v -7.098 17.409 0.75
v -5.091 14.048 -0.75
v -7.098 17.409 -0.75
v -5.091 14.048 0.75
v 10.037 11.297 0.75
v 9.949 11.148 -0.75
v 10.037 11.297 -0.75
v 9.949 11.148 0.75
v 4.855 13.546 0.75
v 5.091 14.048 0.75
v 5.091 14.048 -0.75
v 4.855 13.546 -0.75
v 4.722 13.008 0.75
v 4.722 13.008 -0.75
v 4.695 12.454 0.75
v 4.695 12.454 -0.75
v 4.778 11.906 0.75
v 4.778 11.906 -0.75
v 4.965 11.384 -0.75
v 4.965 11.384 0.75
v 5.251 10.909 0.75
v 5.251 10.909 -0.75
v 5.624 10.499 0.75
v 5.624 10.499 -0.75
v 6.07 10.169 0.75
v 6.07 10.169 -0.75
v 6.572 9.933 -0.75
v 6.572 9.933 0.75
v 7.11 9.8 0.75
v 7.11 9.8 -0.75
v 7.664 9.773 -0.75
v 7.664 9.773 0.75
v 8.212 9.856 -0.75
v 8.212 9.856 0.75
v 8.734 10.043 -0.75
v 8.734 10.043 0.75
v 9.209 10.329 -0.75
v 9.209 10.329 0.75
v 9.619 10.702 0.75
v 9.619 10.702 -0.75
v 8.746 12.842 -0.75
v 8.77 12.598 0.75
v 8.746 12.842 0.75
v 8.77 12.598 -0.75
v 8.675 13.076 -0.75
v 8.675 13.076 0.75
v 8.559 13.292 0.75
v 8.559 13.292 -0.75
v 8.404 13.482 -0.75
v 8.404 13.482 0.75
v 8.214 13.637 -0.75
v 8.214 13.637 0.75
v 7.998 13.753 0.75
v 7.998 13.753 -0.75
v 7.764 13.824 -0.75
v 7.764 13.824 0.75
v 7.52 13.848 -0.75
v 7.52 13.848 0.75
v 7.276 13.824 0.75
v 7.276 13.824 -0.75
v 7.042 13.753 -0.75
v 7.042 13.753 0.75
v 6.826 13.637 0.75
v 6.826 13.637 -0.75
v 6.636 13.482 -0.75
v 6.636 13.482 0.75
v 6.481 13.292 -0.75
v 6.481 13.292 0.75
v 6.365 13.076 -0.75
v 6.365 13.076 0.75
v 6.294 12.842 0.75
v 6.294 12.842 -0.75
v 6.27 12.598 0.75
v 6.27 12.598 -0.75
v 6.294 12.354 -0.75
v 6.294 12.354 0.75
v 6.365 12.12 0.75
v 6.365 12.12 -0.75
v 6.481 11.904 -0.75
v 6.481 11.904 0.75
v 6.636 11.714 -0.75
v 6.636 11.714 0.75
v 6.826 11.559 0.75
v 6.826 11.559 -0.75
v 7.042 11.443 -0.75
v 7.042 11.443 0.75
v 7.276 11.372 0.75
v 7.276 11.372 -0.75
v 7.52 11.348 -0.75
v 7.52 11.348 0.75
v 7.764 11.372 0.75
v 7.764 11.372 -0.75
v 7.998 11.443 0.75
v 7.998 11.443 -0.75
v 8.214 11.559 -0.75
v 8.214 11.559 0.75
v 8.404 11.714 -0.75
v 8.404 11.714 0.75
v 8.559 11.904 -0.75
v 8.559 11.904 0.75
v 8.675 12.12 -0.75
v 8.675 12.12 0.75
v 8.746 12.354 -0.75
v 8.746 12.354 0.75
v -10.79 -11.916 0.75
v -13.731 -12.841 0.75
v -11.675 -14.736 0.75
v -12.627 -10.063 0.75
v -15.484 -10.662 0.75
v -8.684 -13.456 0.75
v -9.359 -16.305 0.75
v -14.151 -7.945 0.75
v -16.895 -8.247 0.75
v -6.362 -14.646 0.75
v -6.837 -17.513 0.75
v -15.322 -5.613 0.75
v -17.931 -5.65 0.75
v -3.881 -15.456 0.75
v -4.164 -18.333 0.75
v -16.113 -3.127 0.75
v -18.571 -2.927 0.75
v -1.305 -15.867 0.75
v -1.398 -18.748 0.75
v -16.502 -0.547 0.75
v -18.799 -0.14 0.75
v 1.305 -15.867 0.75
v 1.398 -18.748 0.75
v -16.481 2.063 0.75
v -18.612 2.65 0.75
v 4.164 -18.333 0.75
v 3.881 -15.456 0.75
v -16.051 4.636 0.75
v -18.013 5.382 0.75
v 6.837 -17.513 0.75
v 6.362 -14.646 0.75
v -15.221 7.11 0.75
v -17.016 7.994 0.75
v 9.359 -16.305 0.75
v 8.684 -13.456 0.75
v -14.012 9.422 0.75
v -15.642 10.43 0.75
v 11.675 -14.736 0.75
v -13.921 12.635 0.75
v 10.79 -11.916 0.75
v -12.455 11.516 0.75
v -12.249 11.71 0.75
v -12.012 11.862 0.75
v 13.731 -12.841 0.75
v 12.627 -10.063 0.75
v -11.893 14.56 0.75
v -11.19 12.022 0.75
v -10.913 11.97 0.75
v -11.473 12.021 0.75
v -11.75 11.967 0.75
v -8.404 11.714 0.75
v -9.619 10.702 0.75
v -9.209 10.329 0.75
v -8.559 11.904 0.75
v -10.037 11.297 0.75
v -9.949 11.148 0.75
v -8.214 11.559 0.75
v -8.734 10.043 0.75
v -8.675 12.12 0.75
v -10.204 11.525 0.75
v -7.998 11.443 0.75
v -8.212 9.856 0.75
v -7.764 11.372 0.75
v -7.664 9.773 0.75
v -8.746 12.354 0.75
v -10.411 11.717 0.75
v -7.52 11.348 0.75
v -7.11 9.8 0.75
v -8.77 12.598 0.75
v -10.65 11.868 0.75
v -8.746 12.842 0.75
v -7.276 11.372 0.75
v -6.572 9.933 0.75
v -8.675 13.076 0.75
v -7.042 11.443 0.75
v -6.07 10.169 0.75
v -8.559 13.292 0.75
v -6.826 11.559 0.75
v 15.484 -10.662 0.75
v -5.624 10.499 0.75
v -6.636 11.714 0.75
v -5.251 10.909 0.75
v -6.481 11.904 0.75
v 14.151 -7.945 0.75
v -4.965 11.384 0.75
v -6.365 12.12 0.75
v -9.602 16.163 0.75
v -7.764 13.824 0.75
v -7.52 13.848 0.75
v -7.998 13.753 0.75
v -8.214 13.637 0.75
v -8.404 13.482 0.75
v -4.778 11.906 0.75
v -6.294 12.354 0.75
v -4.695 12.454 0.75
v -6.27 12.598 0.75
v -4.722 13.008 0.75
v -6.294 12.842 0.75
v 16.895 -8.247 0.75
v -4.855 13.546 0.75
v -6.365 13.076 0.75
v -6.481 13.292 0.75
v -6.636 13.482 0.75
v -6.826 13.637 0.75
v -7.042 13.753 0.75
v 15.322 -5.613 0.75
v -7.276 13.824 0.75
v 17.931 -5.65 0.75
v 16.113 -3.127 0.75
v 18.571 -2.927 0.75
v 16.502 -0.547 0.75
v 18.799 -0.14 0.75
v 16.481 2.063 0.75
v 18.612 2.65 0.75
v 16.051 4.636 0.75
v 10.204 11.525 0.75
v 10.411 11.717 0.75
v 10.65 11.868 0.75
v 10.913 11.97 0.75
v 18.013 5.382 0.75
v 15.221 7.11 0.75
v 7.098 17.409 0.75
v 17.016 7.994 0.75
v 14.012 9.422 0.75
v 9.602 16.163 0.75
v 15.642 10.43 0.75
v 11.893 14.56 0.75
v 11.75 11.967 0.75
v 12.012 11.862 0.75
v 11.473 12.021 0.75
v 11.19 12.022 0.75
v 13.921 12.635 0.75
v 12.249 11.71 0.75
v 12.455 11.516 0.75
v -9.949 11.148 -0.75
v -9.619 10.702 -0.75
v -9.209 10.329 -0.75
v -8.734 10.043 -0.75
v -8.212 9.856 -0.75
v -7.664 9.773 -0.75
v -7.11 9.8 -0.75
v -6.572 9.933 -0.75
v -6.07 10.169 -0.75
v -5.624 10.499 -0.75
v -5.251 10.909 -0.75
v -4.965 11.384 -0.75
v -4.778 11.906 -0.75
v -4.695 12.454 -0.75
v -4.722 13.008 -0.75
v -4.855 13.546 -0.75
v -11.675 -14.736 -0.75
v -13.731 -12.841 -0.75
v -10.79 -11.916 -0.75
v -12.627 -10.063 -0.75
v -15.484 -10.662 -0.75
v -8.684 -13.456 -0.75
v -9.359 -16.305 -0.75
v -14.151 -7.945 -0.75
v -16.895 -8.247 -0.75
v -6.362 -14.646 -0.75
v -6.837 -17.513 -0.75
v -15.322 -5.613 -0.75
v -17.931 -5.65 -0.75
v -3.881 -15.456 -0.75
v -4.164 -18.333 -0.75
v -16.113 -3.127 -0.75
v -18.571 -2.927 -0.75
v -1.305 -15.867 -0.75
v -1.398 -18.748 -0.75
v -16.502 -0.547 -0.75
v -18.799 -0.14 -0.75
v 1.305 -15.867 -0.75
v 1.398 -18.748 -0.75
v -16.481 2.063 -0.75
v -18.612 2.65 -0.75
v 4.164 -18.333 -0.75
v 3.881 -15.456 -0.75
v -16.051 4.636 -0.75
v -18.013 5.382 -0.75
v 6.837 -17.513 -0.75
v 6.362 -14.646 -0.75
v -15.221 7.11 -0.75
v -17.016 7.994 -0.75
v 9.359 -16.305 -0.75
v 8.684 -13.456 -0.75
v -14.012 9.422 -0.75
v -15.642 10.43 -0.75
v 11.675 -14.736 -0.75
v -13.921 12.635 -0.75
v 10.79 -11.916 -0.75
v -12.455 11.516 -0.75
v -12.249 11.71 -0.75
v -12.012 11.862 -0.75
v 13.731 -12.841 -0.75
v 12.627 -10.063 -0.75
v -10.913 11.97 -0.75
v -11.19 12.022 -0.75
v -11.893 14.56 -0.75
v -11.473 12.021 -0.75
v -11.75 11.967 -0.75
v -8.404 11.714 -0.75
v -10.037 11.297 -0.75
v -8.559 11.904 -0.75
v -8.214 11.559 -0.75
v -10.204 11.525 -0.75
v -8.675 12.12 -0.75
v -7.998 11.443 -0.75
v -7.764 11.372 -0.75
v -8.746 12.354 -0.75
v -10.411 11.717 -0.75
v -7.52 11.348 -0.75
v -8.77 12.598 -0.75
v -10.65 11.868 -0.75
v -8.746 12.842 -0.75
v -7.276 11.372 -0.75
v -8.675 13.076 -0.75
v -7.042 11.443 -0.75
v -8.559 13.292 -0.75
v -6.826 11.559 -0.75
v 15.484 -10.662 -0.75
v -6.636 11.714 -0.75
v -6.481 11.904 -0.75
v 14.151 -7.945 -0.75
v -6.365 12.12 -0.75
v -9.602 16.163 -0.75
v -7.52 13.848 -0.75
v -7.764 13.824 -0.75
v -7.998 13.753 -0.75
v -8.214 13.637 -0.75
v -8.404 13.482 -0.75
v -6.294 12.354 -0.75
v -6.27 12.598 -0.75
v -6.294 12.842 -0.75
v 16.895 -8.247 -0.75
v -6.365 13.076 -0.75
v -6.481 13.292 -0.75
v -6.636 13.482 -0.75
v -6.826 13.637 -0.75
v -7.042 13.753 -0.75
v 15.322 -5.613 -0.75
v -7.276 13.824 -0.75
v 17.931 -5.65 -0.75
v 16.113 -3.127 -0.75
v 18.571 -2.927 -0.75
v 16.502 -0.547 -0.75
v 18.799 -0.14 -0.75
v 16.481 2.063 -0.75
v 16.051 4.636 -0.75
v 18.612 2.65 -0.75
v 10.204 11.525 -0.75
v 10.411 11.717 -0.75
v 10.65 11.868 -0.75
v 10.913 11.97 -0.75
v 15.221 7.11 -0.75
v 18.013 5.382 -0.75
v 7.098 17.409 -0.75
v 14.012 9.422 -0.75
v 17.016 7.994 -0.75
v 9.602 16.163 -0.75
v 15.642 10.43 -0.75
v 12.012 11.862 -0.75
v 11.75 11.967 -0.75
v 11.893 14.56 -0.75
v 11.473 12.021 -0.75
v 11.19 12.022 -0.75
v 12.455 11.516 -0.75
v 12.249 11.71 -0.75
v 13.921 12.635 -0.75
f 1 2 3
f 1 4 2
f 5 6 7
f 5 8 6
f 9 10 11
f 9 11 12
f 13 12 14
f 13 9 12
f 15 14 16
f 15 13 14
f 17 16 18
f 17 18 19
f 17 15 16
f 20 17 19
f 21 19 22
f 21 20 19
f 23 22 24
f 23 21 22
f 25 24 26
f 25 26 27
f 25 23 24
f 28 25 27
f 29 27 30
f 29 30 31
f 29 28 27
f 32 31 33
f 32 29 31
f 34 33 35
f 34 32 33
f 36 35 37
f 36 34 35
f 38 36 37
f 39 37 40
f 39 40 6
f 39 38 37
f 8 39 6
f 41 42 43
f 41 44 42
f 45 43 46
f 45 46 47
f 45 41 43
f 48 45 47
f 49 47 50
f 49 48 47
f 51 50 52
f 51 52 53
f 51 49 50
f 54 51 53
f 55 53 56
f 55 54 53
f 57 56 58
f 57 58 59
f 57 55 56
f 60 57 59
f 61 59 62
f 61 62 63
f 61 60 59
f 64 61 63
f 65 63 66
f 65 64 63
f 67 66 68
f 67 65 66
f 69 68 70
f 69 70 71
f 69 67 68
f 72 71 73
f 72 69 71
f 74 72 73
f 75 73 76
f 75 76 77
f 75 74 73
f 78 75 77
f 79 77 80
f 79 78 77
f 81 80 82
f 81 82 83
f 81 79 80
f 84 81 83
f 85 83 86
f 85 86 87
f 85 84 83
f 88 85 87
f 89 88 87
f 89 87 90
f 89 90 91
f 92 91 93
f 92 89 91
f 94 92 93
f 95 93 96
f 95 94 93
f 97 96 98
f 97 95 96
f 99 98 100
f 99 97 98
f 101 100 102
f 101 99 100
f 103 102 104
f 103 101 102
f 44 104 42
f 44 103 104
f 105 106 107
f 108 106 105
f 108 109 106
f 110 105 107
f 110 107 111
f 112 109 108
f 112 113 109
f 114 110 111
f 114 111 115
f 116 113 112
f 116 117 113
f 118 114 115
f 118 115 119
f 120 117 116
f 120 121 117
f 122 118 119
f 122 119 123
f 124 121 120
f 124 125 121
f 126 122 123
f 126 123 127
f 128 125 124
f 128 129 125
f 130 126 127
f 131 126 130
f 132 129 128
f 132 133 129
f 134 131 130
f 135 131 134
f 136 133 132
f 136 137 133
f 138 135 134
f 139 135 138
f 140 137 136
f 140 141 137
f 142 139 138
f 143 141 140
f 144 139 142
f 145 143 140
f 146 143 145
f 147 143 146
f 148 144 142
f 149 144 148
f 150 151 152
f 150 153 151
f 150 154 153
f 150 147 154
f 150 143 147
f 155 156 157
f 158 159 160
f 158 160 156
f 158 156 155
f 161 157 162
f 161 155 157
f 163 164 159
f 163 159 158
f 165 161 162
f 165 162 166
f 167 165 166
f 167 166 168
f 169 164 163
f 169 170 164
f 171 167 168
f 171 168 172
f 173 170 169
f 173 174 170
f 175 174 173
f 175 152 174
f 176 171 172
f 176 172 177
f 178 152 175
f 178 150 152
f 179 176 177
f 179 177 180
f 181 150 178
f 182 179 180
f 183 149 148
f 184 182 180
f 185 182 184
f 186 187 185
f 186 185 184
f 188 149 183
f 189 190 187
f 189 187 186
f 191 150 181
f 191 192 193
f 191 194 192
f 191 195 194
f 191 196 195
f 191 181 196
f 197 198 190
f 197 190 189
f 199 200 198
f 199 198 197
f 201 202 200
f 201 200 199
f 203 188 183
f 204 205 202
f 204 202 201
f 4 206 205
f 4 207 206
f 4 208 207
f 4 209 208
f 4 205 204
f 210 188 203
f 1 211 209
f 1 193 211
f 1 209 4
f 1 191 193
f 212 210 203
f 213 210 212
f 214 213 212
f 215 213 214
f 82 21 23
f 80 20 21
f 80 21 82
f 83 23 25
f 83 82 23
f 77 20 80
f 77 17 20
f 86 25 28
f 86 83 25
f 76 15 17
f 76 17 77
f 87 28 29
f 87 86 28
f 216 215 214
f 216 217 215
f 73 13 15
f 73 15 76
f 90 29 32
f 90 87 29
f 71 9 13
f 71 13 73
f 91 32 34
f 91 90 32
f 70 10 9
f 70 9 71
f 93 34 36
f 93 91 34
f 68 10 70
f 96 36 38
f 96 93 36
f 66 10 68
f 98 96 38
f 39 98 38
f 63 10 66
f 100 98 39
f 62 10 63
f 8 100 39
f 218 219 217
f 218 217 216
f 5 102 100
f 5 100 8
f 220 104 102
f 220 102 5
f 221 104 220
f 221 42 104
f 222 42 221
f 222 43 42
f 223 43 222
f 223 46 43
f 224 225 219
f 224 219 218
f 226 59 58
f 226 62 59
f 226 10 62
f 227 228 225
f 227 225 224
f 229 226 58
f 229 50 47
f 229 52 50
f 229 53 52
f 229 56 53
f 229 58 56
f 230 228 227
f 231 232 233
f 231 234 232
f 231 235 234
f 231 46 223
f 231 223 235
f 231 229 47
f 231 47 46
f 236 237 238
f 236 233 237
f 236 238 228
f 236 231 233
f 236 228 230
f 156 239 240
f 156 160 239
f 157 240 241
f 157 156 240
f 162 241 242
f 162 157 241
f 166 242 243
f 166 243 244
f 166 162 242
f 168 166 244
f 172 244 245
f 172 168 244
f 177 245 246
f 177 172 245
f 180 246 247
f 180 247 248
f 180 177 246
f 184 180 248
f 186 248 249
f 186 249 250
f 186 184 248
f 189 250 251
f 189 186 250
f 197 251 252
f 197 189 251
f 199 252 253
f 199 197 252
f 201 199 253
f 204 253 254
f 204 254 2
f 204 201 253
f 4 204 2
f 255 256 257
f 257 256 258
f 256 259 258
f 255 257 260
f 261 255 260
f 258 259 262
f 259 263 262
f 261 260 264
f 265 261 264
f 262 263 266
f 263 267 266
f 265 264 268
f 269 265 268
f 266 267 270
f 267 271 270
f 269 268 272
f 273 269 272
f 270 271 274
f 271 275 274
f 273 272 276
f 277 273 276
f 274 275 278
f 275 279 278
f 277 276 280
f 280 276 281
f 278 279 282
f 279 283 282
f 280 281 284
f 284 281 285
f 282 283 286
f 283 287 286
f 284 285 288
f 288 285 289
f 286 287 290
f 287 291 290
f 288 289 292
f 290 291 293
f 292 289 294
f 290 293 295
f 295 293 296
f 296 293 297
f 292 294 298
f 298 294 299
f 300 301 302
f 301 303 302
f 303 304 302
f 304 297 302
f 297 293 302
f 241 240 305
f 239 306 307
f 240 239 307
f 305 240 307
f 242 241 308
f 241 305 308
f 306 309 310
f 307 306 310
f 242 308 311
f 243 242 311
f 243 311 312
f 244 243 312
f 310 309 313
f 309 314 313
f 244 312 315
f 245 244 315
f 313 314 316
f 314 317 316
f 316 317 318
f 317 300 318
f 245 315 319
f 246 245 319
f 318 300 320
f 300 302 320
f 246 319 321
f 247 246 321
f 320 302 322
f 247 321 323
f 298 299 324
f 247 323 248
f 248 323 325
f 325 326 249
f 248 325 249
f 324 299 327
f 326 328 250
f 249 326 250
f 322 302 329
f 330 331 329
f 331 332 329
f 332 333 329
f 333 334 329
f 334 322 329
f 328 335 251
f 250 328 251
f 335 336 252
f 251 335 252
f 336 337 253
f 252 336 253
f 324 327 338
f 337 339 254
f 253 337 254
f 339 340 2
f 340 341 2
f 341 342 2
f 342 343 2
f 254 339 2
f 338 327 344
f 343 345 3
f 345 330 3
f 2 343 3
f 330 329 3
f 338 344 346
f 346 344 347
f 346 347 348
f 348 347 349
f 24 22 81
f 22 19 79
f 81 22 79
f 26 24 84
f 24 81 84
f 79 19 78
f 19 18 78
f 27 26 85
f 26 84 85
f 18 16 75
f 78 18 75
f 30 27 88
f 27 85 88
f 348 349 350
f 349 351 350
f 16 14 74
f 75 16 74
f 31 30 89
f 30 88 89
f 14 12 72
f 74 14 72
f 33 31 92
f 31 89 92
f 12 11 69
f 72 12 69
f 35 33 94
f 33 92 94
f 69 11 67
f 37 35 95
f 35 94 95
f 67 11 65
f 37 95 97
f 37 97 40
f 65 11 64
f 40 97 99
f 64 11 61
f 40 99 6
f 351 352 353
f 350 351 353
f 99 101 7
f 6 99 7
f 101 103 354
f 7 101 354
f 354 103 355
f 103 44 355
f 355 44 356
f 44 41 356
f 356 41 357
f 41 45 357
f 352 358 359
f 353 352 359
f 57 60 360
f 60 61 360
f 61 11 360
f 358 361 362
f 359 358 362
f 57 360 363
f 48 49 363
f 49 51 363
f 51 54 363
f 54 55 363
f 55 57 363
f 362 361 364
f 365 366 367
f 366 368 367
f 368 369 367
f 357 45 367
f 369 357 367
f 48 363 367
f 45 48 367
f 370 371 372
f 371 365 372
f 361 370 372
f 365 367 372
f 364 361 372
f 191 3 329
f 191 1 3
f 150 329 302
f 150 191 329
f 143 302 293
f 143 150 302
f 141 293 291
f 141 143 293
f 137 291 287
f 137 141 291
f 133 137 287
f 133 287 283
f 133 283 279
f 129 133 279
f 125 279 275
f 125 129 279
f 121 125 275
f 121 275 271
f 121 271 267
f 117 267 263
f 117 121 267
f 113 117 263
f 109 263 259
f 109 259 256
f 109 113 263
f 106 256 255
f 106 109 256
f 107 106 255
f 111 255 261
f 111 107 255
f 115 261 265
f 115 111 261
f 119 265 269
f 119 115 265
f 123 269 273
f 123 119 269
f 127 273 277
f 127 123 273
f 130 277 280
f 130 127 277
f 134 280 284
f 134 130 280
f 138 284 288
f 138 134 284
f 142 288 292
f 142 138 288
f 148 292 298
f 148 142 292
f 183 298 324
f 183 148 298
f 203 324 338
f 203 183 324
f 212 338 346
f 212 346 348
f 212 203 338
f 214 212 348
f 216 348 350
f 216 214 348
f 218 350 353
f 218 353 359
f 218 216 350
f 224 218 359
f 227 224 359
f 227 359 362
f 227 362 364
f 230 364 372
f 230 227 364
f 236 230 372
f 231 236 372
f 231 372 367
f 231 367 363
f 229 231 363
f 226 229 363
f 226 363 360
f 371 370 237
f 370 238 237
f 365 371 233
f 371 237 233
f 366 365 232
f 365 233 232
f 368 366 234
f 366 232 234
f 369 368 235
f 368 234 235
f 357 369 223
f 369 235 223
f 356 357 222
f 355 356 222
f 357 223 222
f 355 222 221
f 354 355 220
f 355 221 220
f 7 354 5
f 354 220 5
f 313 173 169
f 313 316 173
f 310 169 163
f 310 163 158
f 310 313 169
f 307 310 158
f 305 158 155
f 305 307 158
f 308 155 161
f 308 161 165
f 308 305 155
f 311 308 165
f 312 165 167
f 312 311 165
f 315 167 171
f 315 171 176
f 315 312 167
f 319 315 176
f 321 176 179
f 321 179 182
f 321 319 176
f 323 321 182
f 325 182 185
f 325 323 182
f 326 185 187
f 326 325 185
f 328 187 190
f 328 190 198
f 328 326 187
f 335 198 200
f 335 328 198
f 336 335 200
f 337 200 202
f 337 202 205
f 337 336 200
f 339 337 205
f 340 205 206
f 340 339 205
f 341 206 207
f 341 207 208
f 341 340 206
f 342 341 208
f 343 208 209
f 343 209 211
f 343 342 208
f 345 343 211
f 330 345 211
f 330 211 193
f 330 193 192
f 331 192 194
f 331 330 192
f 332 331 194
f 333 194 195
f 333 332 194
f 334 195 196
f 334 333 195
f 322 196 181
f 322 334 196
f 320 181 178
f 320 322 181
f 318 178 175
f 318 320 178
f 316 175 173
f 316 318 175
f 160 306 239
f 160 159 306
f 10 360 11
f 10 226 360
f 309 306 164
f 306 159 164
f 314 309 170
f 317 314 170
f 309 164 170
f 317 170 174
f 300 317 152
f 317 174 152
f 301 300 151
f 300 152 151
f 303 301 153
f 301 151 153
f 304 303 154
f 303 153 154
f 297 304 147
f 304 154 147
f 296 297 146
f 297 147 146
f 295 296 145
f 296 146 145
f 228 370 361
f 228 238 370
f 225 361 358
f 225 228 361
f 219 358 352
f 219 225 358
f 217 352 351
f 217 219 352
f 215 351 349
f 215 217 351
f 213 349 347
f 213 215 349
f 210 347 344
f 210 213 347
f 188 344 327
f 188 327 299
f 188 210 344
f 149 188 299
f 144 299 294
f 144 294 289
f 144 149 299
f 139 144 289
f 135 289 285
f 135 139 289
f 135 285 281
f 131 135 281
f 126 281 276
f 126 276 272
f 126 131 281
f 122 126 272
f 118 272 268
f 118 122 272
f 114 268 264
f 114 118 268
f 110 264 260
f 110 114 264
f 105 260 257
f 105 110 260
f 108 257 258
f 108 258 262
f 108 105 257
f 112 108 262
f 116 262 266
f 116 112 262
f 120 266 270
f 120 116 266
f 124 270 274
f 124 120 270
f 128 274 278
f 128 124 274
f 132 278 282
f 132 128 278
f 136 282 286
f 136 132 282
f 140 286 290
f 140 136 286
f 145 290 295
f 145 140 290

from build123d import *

# Parameters (mm, degrees)
SKETCH1_R           = 1.25
BOSS_EXTRUDE1_DEPTH = 0.75
FILLET1_R           = 1.5


with BuildPart() as part:
    # Sketch1 → Boss-Extrude1 (new, symmetric)
    with BuildSketch(Plane.XY):
        with BuildLine():
            Line((7.097768331, 17.408666943), (5.091491735, 14.047621322))
            ThreePointArc((5.091491735, 14.047621322), (6.070373947, 10.169487005), (9.948508265, 11.148369217))
            Line((9.948508265, 11.148369217), (11.028531075, 12.957693985))
            ThreePointArc((11.028531075, 12.957693985), (0, -15.918193069), (-11.028531075, 12.957693985))
            Line((-11.028531075, 12.957693985), (-9.948508265, 11.148369217))
            ThreePointArc((-9.948508265, 11.148369217), (-6.070373947, 10.169487005), (-5.091491735, 14.047621322))
            Line((-5.091491735, 14.047621322), (-7.097768331, 17.408666943))
            ThreePointArc((-7.097768331, 17.408666943), (0, -18.8), (7.097768331, 17.408666943))
        make_face()
        with Locations(Location((-7.52, 12.59799527, 0), (0, 0, 180))):
            Circle(SKETCH1_R, mode=Mode.SUBTRACT)
        with Locations((7.52, 12.59799527)):
            Circle(SKETCH1_R, mode=Mode.SUBTRACT)
    extrude(amount=BOSS_EXTRUDE1_DEPTH, both=True)

    # Fillet1
    fillet1_edges = [part.edges().sort_by_distance(p)[0] for p in [
        (-11.028531075, 12.957693985, 0),
        (11.028531075, 12.957693985, 0),
    ]]
    fillet(fillet1_edges, radius=FILLET1_R)


solid = part.part
